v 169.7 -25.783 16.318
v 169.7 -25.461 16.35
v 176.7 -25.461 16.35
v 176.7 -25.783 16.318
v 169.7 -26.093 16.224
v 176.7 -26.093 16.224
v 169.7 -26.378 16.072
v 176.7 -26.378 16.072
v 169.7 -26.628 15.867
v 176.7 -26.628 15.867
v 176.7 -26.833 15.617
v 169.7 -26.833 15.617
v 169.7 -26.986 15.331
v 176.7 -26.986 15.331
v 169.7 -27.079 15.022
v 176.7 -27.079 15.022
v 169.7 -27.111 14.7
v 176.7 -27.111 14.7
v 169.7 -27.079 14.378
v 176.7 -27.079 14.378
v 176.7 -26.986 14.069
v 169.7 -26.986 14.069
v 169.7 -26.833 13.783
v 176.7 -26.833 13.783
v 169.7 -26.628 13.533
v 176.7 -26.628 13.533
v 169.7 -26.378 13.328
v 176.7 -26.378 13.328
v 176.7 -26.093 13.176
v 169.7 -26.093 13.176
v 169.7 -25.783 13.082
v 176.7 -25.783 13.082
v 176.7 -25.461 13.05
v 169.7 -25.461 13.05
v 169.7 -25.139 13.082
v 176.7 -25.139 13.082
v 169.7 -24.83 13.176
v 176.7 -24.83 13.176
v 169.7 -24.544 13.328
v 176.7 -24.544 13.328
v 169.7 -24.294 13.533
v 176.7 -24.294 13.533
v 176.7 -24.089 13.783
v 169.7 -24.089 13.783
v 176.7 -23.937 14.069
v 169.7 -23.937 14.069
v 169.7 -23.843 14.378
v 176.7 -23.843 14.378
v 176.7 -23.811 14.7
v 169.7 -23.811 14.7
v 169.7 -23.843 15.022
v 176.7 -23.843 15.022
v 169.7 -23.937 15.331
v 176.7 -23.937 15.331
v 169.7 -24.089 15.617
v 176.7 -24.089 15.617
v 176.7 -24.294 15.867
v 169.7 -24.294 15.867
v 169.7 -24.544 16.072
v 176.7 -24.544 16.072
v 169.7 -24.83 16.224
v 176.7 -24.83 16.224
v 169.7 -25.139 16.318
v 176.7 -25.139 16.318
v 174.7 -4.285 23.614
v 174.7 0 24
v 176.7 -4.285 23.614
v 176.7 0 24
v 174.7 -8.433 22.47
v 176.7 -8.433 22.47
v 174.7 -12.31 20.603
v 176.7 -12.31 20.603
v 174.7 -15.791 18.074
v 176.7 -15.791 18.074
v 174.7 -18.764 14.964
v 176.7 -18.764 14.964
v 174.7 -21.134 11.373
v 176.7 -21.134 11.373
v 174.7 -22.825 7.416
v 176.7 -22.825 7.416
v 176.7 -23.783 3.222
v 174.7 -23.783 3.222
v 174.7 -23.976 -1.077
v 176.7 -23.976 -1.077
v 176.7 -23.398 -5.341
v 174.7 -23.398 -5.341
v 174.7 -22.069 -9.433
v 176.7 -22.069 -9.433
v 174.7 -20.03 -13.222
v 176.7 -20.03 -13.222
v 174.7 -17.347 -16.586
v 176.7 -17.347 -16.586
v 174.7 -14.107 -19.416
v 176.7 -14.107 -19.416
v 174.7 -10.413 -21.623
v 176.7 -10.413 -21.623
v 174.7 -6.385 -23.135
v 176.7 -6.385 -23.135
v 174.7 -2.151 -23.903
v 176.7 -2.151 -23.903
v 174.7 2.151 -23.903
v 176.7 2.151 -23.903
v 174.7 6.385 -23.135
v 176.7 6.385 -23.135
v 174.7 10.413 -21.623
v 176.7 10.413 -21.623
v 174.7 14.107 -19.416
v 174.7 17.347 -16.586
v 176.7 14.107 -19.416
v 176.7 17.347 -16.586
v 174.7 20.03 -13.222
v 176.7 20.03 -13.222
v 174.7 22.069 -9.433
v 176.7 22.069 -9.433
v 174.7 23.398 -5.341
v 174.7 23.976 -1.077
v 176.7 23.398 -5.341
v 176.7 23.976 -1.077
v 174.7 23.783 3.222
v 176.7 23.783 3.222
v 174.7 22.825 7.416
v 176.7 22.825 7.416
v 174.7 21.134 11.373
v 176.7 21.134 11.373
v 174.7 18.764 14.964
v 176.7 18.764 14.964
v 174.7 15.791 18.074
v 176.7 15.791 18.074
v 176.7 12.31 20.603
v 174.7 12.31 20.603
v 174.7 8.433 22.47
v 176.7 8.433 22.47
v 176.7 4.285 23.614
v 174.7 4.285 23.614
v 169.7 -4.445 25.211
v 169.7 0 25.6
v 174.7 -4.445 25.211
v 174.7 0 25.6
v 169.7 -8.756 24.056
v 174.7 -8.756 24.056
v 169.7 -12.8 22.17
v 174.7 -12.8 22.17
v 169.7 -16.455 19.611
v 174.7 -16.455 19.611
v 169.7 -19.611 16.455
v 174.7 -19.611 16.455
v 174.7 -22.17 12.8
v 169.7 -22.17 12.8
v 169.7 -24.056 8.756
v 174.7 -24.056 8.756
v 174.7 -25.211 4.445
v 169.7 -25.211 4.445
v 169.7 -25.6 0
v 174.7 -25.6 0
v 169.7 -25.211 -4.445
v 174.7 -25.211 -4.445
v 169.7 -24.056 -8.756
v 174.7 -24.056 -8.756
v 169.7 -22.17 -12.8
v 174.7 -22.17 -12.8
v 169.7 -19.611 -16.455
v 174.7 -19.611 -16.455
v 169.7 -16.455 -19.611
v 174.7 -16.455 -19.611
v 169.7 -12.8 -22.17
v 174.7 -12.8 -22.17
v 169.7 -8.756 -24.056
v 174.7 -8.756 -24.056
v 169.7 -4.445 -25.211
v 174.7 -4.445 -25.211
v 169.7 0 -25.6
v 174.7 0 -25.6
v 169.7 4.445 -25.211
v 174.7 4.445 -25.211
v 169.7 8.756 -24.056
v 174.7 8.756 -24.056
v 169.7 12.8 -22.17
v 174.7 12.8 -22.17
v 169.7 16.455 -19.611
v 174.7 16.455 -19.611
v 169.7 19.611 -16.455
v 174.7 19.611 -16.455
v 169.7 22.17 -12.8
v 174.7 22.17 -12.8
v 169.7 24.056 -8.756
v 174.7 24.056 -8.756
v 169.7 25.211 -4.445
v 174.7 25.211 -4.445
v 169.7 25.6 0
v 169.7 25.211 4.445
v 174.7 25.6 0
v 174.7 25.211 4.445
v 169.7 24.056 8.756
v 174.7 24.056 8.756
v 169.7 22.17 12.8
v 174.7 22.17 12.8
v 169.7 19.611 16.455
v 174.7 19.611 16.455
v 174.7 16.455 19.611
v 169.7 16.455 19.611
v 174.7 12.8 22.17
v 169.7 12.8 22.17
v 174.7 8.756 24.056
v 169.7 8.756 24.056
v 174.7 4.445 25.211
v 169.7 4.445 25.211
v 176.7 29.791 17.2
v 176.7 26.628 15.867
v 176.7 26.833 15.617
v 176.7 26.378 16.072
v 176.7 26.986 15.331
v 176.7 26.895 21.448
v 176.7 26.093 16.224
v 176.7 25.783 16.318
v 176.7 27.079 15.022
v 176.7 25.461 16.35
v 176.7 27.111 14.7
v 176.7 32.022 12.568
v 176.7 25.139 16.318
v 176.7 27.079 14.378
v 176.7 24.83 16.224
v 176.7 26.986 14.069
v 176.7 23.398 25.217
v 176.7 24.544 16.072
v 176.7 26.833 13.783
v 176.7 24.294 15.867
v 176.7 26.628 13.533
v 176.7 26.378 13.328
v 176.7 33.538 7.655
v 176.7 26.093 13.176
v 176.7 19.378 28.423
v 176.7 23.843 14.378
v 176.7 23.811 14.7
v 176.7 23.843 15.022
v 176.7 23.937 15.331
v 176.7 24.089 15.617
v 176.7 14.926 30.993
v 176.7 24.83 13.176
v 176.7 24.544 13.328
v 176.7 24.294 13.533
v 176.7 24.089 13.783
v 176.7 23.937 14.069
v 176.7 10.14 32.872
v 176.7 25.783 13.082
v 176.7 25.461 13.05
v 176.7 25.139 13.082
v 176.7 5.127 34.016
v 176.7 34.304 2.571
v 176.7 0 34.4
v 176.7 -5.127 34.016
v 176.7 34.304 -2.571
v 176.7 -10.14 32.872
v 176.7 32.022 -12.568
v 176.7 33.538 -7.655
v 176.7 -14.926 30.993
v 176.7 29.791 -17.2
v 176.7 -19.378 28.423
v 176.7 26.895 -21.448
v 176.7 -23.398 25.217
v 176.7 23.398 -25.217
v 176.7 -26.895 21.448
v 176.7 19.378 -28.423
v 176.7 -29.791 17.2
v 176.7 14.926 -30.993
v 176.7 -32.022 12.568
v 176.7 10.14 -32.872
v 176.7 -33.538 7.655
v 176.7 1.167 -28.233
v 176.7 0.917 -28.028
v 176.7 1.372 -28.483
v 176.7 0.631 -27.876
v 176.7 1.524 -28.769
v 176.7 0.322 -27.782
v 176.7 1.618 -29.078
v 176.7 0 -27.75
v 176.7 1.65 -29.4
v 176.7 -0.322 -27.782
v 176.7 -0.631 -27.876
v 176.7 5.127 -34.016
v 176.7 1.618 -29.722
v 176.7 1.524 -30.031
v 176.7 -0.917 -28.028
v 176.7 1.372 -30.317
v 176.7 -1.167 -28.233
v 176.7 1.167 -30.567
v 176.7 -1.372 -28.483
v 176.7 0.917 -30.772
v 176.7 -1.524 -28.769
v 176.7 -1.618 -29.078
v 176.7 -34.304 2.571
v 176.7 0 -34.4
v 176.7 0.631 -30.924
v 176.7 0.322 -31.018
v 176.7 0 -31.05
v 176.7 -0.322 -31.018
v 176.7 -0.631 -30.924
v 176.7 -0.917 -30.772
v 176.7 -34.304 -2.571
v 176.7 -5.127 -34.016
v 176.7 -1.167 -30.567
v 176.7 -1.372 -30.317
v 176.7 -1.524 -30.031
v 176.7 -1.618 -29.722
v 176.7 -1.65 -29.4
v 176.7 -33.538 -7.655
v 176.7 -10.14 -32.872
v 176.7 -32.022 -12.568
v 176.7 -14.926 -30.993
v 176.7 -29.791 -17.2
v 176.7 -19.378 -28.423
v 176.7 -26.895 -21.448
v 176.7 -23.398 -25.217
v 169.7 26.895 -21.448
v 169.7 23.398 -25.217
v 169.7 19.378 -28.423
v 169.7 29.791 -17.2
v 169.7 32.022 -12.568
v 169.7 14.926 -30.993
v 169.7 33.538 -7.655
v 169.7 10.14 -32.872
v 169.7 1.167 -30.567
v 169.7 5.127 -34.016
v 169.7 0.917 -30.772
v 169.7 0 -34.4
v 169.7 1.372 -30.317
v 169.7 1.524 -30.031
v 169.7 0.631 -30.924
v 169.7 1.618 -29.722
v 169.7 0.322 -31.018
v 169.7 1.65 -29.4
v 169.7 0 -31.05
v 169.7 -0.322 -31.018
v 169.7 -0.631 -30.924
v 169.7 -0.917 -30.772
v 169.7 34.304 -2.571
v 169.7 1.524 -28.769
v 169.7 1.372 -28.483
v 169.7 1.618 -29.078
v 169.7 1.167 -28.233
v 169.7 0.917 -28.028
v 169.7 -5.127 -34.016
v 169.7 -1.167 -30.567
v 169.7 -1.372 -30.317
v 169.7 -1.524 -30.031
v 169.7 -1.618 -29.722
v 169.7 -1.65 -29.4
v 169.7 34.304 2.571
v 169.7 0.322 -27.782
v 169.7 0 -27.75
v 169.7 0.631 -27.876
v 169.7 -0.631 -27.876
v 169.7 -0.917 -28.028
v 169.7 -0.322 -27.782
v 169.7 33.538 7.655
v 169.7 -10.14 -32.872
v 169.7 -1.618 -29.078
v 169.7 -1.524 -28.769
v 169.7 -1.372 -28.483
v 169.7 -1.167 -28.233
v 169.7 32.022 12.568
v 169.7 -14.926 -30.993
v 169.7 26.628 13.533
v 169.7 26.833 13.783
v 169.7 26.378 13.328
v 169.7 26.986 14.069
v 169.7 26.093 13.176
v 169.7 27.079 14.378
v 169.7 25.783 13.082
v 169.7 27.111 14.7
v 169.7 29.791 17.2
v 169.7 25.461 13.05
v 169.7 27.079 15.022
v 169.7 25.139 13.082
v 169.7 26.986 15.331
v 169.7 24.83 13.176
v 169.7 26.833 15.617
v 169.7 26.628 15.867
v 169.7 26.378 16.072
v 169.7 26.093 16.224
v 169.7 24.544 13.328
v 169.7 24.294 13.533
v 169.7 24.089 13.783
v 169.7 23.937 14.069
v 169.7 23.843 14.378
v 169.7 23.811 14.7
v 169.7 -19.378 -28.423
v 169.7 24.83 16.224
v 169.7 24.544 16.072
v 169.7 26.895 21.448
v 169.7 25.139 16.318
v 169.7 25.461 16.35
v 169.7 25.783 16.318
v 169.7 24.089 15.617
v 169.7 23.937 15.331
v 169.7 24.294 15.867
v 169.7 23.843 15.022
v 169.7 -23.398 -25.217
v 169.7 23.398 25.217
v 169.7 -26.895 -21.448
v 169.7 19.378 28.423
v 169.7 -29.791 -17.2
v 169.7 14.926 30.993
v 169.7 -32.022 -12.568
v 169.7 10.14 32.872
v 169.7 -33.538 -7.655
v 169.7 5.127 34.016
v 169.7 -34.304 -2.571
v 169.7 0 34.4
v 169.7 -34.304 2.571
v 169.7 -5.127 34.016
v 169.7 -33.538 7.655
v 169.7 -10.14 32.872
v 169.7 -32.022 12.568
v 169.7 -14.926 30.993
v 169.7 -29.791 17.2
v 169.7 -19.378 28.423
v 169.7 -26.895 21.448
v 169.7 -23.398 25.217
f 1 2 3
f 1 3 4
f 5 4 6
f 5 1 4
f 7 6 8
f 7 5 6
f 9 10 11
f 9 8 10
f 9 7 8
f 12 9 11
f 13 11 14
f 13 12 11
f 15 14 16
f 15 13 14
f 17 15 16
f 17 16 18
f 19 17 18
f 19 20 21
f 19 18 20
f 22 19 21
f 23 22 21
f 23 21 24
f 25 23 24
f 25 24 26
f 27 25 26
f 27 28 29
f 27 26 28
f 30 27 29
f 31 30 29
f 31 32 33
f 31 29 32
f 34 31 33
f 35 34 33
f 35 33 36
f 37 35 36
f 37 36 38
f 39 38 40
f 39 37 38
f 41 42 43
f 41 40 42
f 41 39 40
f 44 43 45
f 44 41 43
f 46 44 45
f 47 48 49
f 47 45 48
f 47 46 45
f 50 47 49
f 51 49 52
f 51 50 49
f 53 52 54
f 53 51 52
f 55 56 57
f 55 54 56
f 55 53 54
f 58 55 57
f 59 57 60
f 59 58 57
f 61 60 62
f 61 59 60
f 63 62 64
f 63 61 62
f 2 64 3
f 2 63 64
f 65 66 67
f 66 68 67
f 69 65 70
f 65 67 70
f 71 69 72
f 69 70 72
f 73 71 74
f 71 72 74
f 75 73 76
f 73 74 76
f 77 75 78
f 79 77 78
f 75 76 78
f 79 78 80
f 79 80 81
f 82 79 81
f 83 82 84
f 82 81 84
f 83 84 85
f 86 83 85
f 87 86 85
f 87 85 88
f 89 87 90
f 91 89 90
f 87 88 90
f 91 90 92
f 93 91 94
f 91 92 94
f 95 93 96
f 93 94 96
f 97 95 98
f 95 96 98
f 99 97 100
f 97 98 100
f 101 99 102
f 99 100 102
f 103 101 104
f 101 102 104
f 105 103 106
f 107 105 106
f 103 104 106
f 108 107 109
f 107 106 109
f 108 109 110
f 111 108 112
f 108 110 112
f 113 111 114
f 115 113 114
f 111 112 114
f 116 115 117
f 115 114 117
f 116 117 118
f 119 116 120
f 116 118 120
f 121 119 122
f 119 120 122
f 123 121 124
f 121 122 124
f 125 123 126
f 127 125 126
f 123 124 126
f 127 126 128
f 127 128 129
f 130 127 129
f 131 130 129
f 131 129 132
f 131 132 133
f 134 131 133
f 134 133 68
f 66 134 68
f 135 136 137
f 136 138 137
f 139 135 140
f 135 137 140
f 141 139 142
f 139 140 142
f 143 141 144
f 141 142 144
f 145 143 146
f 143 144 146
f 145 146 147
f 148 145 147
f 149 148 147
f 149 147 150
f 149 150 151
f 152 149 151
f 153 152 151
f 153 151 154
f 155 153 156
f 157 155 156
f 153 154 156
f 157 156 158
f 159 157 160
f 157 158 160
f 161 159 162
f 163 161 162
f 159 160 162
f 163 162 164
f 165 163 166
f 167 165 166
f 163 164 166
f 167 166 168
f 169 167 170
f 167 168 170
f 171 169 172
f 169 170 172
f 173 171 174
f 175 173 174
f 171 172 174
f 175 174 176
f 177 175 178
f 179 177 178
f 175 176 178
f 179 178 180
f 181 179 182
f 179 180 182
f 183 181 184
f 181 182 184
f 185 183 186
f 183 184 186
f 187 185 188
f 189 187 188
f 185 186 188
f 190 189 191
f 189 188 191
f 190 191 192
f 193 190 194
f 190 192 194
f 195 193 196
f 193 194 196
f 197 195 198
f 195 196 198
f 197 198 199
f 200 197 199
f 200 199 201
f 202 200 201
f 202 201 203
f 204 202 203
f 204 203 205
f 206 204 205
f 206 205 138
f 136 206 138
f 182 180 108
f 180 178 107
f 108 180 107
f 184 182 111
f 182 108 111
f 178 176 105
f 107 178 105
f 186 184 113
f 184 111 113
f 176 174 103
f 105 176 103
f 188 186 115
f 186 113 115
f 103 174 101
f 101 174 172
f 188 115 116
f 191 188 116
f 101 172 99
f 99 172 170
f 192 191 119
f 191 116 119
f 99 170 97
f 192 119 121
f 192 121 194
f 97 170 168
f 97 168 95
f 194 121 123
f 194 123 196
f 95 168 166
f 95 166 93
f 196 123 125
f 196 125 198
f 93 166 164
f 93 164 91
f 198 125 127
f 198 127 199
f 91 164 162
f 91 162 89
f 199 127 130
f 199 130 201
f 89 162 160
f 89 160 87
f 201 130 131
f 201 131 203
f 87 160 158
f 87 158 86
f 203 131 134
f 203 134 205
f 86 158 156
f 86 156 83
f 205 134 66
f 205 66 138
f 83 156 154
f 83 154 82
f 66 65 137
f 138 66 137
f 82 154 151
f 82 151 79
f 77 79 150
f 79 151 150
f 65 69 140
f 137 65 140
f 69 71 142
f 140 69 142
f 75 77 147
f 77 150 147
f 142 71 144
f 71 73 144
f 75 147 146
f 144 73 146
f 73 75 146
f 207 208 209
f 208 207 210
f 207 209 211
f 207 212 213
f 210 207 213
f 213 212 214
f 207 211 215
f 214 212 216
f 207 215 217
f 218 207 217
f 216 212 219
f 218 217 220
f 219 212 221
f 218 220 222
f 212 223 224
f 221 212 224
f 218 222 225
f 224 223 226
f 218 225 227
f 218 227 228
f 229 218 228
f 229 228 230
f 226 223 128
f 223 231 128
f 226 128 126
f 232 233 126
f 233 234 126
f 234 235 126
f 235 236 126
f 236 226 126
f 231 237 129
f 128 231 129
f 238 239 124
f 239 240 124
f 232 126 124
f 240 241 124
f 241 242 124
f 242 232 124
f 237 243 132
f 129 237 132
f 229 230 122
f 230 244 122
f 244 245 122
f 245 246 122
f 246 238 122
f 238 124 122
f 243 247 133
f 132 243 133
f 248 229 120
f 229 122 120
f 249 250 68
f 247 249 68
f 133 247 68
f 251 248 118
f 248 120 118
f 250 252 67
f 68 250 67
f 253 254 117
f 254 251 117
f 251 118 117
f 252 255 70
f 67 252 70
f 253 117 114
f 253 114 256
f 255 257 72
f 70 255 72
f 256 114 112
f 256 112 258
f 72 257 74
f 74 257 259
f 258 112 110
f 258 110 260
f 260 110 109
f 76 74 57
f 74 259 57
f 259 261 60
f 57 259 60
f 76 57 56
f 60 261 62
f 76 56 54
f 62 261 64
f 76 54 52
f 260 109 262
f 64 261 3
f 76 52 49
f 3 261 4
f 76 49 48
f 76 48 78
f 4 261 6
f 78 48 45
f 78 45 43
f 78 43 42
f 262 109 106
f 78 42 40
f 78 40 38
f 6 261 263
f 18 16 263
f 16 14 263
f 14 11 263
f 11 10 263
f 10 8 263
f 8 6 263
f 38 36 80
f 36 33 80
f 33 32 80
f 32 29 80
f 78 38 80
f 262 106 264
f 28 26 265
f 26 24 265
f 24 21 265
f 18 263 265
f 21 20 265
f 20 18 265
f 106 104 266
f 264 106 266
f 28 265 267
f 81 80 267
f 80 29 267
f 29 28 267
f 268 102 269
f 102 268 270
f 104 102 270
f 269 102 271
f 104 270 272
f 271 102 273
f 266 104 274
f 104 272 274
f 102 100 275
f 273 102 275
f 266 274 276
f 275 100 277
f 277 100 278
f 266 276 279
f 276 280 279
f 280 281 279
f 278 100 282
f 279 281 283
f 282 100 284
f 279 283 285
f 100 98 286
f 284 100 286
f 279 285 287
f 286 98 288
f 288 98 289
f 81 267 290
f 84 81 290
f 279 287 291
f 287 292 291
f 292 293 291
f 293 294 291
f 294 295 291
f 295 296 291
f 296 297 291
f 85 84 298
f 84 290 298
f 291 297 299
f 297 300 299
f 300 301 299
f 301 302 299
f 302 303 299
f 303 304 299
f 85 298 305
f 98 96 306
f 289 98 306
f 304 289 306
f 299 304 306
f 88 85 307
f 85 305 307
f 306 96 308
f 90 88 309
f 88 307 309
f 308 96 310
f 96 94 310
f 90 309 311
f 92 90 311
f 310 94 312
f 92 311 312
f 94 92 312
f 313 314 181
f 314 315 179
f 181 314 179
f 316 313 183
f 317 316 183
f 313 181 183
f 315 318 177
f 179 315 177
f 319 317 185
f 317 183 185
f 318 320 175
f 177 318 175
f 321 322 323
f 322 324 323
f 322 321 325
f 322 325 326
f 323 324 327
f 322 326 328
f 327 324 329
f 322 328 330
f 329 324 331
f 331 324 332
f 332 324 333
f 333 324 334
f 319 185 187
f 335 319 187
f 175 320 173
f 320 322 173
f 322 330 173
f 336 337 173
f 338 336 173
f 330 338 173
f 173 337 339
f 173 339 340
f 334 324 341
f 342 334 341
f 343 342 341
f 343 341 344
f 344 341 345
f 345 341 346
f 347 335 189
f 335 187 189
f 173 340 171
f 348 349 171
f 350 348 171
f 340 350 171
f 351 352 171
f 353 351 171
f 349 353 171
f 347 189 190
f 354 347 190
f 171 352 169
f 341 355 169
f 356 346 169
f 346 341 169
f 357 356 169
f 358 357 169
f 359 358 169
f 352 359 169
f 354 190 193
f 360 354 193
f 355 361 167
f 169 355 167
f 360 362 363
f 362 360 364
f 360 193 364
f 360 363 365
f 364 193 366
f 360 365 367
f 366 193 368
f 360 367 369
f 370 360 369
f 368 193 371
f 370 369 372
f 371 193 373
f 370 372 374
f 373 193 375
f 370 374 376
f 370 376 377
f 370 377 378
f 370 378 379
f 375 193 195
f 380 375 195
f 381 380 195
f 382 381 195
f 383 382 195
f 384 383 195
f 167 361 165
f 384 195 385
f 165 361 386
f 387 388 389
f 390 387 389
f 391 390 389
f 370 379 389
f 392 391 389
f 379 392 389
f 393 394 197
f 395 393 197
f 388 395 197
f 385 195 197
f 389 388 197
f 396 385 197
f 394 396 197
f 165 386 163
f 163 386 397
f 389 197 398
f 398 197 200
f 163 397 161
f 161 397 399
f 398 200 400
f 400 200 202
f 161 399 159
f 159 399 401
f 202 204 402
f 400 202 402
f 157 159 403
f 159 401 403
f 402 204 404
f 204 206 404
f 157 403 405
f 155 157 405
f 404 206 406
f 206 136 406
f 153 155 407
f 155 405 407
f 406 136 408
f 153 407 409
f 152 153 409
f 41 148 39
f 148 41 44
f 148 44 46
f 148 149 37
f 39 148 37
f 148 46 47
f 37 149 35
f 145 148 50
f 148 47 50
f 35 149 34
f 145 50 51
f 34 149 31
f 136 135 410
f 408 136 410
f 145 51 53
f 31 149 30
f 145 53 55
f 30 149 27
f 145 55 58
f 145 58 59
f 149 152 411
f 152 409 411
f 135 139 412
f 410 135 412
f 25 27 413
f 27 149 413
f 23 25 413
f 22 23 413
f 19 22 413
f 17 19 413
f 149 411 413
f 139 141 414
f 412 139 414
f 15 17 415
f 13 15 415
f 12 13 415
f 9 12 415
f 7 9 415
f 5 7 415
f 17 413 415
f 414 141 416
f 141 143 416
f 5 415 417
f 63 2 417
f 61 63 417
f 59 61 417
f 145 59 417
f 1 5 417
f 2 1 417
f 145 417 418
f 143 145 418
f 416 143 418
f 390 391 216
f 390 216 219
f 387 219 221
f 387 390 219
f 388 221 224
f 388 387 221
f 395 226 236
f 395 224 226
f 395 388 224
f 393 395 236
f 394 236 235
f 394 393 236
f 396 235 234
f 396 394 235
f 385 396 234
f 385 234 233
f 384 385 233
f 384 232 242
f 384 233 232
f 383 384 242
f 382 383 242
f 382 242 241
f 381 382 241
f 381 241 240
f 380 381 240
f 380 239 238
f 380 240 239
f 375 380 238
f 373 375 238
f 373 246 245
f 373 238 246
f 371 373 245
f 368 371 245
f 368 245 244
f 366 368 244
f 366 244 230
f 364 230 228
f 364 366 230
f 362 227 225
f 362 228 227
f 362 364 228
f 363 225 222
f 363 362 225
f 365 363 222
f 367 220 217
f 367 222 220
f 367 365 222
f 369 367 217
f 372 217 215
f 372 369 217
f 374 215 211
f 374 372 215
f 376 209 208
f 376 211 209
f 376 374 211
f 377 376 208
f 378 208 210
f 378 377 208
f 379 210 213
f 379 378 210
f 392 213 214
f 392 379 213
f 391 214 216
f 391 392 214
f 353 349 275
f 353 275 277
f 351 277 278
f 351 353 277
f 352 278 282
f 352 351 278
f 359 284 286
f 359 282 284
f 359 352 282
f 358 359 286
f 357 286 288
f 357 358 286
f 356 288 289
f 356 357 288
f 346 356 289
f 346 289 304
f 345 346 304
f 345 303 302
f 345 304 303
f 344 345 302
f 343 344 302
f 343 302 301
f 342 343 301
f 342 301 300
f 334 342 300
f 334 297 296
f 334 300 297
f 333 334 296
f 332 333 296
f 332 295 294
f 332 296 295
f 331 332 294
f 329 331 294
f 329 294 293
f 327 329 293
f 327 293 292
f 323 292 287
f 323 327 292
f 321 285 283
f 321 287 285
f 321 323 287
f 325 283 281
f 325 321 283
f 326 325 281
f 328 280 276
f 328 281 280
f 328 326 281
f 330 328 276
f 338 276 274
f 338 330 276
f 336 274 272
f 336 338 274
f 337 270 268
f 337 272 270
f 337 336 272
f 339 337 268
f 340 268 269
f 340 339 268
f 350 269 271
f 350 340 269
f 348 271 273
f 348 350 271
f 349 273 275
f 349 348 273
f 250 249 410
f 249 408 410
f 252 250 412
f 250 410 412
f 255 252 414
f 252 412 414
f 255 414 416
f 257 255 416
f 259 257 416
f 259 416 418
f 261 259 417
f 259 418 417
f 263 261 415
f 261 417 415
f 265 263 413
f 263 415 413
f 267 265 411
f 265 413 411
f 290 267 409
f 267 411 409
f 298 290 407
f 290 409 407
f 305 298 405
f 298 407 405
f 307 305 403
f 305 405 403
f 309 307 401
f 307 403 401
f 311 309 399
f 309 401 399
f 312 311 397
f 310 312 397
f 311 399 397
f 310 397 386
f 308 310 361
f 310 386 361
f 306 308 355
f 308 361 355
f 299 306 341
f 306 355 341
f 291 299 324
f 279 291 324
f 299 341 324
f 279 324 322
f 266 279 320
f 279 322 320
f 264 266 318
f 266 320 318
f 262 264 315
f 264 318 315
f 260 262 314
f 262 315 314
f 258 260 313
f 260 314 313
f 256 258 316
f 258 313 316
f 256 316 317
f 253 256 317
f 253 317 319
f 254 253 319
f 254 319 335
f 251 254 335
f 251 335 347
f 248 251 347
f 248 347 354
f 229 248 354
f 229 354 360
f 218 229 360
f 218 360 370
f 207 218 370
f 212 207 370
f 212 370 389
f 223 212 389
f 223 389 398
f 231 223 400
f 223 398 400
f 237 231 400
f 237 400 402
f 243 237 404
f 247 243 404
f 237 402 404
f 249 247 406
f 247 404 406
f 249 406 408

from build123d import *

# Parameters (mm, degrees)
AXIAL_HOLES_DEPTH      = 184.274684558
AXIAL_HOLES_DEPTH_BACK = 184.274684558
SKETCH2_R              = 1.65


with BuildPart() as part:
    # Axial profile (mm) → Full revolution (revolve)
    with BuildSketch(Plane.XY, mode=Mode.PRIVATE) as full_revolution_sk:
        Polygon((169.7, 25.6), (174.7, 25.6), (174.7, 24), (176.7, 24), (176.7, 34.4), (169.7, 34.4), align=None)
    revolve(full_revolution_sk.sketch.rotate(Axis((-110, 0, 0), (1, 0, 0)), 90), axis=Axis((-110, 0, 0), (1, 0, 0)))

    # Sketch2 → Axial holes (cut, two sides: drawn at the far end of the back side and taken through both)
    with BuildSketch(Plane(origin=(0, 0, 0), x_dir=(0, 0, -1), z_dir=(1, 0, 0)).offset(-AXIAL_HOLES_DEPTH_BACK)):
        with Locations(Location((29.4, 0, 0), (0, 0, 180))):
            Circle(SKETCH2_R)
        with Locations(Location((-14.7, 25.461146871, 0), (0, 0, 180))):
            Circle(SKETCH2_R)
        with Locations(Location((-14.7, -25.461146871, 0), (0, 0, 180))):
            Circle(SKETCH2_R)
    extrude(amount=AXIAL_HOLES_DEPTH + AXIAL_HOLES_DEPTH_BACK, mode=Mode.SUBTRACT)


solid = part.part
